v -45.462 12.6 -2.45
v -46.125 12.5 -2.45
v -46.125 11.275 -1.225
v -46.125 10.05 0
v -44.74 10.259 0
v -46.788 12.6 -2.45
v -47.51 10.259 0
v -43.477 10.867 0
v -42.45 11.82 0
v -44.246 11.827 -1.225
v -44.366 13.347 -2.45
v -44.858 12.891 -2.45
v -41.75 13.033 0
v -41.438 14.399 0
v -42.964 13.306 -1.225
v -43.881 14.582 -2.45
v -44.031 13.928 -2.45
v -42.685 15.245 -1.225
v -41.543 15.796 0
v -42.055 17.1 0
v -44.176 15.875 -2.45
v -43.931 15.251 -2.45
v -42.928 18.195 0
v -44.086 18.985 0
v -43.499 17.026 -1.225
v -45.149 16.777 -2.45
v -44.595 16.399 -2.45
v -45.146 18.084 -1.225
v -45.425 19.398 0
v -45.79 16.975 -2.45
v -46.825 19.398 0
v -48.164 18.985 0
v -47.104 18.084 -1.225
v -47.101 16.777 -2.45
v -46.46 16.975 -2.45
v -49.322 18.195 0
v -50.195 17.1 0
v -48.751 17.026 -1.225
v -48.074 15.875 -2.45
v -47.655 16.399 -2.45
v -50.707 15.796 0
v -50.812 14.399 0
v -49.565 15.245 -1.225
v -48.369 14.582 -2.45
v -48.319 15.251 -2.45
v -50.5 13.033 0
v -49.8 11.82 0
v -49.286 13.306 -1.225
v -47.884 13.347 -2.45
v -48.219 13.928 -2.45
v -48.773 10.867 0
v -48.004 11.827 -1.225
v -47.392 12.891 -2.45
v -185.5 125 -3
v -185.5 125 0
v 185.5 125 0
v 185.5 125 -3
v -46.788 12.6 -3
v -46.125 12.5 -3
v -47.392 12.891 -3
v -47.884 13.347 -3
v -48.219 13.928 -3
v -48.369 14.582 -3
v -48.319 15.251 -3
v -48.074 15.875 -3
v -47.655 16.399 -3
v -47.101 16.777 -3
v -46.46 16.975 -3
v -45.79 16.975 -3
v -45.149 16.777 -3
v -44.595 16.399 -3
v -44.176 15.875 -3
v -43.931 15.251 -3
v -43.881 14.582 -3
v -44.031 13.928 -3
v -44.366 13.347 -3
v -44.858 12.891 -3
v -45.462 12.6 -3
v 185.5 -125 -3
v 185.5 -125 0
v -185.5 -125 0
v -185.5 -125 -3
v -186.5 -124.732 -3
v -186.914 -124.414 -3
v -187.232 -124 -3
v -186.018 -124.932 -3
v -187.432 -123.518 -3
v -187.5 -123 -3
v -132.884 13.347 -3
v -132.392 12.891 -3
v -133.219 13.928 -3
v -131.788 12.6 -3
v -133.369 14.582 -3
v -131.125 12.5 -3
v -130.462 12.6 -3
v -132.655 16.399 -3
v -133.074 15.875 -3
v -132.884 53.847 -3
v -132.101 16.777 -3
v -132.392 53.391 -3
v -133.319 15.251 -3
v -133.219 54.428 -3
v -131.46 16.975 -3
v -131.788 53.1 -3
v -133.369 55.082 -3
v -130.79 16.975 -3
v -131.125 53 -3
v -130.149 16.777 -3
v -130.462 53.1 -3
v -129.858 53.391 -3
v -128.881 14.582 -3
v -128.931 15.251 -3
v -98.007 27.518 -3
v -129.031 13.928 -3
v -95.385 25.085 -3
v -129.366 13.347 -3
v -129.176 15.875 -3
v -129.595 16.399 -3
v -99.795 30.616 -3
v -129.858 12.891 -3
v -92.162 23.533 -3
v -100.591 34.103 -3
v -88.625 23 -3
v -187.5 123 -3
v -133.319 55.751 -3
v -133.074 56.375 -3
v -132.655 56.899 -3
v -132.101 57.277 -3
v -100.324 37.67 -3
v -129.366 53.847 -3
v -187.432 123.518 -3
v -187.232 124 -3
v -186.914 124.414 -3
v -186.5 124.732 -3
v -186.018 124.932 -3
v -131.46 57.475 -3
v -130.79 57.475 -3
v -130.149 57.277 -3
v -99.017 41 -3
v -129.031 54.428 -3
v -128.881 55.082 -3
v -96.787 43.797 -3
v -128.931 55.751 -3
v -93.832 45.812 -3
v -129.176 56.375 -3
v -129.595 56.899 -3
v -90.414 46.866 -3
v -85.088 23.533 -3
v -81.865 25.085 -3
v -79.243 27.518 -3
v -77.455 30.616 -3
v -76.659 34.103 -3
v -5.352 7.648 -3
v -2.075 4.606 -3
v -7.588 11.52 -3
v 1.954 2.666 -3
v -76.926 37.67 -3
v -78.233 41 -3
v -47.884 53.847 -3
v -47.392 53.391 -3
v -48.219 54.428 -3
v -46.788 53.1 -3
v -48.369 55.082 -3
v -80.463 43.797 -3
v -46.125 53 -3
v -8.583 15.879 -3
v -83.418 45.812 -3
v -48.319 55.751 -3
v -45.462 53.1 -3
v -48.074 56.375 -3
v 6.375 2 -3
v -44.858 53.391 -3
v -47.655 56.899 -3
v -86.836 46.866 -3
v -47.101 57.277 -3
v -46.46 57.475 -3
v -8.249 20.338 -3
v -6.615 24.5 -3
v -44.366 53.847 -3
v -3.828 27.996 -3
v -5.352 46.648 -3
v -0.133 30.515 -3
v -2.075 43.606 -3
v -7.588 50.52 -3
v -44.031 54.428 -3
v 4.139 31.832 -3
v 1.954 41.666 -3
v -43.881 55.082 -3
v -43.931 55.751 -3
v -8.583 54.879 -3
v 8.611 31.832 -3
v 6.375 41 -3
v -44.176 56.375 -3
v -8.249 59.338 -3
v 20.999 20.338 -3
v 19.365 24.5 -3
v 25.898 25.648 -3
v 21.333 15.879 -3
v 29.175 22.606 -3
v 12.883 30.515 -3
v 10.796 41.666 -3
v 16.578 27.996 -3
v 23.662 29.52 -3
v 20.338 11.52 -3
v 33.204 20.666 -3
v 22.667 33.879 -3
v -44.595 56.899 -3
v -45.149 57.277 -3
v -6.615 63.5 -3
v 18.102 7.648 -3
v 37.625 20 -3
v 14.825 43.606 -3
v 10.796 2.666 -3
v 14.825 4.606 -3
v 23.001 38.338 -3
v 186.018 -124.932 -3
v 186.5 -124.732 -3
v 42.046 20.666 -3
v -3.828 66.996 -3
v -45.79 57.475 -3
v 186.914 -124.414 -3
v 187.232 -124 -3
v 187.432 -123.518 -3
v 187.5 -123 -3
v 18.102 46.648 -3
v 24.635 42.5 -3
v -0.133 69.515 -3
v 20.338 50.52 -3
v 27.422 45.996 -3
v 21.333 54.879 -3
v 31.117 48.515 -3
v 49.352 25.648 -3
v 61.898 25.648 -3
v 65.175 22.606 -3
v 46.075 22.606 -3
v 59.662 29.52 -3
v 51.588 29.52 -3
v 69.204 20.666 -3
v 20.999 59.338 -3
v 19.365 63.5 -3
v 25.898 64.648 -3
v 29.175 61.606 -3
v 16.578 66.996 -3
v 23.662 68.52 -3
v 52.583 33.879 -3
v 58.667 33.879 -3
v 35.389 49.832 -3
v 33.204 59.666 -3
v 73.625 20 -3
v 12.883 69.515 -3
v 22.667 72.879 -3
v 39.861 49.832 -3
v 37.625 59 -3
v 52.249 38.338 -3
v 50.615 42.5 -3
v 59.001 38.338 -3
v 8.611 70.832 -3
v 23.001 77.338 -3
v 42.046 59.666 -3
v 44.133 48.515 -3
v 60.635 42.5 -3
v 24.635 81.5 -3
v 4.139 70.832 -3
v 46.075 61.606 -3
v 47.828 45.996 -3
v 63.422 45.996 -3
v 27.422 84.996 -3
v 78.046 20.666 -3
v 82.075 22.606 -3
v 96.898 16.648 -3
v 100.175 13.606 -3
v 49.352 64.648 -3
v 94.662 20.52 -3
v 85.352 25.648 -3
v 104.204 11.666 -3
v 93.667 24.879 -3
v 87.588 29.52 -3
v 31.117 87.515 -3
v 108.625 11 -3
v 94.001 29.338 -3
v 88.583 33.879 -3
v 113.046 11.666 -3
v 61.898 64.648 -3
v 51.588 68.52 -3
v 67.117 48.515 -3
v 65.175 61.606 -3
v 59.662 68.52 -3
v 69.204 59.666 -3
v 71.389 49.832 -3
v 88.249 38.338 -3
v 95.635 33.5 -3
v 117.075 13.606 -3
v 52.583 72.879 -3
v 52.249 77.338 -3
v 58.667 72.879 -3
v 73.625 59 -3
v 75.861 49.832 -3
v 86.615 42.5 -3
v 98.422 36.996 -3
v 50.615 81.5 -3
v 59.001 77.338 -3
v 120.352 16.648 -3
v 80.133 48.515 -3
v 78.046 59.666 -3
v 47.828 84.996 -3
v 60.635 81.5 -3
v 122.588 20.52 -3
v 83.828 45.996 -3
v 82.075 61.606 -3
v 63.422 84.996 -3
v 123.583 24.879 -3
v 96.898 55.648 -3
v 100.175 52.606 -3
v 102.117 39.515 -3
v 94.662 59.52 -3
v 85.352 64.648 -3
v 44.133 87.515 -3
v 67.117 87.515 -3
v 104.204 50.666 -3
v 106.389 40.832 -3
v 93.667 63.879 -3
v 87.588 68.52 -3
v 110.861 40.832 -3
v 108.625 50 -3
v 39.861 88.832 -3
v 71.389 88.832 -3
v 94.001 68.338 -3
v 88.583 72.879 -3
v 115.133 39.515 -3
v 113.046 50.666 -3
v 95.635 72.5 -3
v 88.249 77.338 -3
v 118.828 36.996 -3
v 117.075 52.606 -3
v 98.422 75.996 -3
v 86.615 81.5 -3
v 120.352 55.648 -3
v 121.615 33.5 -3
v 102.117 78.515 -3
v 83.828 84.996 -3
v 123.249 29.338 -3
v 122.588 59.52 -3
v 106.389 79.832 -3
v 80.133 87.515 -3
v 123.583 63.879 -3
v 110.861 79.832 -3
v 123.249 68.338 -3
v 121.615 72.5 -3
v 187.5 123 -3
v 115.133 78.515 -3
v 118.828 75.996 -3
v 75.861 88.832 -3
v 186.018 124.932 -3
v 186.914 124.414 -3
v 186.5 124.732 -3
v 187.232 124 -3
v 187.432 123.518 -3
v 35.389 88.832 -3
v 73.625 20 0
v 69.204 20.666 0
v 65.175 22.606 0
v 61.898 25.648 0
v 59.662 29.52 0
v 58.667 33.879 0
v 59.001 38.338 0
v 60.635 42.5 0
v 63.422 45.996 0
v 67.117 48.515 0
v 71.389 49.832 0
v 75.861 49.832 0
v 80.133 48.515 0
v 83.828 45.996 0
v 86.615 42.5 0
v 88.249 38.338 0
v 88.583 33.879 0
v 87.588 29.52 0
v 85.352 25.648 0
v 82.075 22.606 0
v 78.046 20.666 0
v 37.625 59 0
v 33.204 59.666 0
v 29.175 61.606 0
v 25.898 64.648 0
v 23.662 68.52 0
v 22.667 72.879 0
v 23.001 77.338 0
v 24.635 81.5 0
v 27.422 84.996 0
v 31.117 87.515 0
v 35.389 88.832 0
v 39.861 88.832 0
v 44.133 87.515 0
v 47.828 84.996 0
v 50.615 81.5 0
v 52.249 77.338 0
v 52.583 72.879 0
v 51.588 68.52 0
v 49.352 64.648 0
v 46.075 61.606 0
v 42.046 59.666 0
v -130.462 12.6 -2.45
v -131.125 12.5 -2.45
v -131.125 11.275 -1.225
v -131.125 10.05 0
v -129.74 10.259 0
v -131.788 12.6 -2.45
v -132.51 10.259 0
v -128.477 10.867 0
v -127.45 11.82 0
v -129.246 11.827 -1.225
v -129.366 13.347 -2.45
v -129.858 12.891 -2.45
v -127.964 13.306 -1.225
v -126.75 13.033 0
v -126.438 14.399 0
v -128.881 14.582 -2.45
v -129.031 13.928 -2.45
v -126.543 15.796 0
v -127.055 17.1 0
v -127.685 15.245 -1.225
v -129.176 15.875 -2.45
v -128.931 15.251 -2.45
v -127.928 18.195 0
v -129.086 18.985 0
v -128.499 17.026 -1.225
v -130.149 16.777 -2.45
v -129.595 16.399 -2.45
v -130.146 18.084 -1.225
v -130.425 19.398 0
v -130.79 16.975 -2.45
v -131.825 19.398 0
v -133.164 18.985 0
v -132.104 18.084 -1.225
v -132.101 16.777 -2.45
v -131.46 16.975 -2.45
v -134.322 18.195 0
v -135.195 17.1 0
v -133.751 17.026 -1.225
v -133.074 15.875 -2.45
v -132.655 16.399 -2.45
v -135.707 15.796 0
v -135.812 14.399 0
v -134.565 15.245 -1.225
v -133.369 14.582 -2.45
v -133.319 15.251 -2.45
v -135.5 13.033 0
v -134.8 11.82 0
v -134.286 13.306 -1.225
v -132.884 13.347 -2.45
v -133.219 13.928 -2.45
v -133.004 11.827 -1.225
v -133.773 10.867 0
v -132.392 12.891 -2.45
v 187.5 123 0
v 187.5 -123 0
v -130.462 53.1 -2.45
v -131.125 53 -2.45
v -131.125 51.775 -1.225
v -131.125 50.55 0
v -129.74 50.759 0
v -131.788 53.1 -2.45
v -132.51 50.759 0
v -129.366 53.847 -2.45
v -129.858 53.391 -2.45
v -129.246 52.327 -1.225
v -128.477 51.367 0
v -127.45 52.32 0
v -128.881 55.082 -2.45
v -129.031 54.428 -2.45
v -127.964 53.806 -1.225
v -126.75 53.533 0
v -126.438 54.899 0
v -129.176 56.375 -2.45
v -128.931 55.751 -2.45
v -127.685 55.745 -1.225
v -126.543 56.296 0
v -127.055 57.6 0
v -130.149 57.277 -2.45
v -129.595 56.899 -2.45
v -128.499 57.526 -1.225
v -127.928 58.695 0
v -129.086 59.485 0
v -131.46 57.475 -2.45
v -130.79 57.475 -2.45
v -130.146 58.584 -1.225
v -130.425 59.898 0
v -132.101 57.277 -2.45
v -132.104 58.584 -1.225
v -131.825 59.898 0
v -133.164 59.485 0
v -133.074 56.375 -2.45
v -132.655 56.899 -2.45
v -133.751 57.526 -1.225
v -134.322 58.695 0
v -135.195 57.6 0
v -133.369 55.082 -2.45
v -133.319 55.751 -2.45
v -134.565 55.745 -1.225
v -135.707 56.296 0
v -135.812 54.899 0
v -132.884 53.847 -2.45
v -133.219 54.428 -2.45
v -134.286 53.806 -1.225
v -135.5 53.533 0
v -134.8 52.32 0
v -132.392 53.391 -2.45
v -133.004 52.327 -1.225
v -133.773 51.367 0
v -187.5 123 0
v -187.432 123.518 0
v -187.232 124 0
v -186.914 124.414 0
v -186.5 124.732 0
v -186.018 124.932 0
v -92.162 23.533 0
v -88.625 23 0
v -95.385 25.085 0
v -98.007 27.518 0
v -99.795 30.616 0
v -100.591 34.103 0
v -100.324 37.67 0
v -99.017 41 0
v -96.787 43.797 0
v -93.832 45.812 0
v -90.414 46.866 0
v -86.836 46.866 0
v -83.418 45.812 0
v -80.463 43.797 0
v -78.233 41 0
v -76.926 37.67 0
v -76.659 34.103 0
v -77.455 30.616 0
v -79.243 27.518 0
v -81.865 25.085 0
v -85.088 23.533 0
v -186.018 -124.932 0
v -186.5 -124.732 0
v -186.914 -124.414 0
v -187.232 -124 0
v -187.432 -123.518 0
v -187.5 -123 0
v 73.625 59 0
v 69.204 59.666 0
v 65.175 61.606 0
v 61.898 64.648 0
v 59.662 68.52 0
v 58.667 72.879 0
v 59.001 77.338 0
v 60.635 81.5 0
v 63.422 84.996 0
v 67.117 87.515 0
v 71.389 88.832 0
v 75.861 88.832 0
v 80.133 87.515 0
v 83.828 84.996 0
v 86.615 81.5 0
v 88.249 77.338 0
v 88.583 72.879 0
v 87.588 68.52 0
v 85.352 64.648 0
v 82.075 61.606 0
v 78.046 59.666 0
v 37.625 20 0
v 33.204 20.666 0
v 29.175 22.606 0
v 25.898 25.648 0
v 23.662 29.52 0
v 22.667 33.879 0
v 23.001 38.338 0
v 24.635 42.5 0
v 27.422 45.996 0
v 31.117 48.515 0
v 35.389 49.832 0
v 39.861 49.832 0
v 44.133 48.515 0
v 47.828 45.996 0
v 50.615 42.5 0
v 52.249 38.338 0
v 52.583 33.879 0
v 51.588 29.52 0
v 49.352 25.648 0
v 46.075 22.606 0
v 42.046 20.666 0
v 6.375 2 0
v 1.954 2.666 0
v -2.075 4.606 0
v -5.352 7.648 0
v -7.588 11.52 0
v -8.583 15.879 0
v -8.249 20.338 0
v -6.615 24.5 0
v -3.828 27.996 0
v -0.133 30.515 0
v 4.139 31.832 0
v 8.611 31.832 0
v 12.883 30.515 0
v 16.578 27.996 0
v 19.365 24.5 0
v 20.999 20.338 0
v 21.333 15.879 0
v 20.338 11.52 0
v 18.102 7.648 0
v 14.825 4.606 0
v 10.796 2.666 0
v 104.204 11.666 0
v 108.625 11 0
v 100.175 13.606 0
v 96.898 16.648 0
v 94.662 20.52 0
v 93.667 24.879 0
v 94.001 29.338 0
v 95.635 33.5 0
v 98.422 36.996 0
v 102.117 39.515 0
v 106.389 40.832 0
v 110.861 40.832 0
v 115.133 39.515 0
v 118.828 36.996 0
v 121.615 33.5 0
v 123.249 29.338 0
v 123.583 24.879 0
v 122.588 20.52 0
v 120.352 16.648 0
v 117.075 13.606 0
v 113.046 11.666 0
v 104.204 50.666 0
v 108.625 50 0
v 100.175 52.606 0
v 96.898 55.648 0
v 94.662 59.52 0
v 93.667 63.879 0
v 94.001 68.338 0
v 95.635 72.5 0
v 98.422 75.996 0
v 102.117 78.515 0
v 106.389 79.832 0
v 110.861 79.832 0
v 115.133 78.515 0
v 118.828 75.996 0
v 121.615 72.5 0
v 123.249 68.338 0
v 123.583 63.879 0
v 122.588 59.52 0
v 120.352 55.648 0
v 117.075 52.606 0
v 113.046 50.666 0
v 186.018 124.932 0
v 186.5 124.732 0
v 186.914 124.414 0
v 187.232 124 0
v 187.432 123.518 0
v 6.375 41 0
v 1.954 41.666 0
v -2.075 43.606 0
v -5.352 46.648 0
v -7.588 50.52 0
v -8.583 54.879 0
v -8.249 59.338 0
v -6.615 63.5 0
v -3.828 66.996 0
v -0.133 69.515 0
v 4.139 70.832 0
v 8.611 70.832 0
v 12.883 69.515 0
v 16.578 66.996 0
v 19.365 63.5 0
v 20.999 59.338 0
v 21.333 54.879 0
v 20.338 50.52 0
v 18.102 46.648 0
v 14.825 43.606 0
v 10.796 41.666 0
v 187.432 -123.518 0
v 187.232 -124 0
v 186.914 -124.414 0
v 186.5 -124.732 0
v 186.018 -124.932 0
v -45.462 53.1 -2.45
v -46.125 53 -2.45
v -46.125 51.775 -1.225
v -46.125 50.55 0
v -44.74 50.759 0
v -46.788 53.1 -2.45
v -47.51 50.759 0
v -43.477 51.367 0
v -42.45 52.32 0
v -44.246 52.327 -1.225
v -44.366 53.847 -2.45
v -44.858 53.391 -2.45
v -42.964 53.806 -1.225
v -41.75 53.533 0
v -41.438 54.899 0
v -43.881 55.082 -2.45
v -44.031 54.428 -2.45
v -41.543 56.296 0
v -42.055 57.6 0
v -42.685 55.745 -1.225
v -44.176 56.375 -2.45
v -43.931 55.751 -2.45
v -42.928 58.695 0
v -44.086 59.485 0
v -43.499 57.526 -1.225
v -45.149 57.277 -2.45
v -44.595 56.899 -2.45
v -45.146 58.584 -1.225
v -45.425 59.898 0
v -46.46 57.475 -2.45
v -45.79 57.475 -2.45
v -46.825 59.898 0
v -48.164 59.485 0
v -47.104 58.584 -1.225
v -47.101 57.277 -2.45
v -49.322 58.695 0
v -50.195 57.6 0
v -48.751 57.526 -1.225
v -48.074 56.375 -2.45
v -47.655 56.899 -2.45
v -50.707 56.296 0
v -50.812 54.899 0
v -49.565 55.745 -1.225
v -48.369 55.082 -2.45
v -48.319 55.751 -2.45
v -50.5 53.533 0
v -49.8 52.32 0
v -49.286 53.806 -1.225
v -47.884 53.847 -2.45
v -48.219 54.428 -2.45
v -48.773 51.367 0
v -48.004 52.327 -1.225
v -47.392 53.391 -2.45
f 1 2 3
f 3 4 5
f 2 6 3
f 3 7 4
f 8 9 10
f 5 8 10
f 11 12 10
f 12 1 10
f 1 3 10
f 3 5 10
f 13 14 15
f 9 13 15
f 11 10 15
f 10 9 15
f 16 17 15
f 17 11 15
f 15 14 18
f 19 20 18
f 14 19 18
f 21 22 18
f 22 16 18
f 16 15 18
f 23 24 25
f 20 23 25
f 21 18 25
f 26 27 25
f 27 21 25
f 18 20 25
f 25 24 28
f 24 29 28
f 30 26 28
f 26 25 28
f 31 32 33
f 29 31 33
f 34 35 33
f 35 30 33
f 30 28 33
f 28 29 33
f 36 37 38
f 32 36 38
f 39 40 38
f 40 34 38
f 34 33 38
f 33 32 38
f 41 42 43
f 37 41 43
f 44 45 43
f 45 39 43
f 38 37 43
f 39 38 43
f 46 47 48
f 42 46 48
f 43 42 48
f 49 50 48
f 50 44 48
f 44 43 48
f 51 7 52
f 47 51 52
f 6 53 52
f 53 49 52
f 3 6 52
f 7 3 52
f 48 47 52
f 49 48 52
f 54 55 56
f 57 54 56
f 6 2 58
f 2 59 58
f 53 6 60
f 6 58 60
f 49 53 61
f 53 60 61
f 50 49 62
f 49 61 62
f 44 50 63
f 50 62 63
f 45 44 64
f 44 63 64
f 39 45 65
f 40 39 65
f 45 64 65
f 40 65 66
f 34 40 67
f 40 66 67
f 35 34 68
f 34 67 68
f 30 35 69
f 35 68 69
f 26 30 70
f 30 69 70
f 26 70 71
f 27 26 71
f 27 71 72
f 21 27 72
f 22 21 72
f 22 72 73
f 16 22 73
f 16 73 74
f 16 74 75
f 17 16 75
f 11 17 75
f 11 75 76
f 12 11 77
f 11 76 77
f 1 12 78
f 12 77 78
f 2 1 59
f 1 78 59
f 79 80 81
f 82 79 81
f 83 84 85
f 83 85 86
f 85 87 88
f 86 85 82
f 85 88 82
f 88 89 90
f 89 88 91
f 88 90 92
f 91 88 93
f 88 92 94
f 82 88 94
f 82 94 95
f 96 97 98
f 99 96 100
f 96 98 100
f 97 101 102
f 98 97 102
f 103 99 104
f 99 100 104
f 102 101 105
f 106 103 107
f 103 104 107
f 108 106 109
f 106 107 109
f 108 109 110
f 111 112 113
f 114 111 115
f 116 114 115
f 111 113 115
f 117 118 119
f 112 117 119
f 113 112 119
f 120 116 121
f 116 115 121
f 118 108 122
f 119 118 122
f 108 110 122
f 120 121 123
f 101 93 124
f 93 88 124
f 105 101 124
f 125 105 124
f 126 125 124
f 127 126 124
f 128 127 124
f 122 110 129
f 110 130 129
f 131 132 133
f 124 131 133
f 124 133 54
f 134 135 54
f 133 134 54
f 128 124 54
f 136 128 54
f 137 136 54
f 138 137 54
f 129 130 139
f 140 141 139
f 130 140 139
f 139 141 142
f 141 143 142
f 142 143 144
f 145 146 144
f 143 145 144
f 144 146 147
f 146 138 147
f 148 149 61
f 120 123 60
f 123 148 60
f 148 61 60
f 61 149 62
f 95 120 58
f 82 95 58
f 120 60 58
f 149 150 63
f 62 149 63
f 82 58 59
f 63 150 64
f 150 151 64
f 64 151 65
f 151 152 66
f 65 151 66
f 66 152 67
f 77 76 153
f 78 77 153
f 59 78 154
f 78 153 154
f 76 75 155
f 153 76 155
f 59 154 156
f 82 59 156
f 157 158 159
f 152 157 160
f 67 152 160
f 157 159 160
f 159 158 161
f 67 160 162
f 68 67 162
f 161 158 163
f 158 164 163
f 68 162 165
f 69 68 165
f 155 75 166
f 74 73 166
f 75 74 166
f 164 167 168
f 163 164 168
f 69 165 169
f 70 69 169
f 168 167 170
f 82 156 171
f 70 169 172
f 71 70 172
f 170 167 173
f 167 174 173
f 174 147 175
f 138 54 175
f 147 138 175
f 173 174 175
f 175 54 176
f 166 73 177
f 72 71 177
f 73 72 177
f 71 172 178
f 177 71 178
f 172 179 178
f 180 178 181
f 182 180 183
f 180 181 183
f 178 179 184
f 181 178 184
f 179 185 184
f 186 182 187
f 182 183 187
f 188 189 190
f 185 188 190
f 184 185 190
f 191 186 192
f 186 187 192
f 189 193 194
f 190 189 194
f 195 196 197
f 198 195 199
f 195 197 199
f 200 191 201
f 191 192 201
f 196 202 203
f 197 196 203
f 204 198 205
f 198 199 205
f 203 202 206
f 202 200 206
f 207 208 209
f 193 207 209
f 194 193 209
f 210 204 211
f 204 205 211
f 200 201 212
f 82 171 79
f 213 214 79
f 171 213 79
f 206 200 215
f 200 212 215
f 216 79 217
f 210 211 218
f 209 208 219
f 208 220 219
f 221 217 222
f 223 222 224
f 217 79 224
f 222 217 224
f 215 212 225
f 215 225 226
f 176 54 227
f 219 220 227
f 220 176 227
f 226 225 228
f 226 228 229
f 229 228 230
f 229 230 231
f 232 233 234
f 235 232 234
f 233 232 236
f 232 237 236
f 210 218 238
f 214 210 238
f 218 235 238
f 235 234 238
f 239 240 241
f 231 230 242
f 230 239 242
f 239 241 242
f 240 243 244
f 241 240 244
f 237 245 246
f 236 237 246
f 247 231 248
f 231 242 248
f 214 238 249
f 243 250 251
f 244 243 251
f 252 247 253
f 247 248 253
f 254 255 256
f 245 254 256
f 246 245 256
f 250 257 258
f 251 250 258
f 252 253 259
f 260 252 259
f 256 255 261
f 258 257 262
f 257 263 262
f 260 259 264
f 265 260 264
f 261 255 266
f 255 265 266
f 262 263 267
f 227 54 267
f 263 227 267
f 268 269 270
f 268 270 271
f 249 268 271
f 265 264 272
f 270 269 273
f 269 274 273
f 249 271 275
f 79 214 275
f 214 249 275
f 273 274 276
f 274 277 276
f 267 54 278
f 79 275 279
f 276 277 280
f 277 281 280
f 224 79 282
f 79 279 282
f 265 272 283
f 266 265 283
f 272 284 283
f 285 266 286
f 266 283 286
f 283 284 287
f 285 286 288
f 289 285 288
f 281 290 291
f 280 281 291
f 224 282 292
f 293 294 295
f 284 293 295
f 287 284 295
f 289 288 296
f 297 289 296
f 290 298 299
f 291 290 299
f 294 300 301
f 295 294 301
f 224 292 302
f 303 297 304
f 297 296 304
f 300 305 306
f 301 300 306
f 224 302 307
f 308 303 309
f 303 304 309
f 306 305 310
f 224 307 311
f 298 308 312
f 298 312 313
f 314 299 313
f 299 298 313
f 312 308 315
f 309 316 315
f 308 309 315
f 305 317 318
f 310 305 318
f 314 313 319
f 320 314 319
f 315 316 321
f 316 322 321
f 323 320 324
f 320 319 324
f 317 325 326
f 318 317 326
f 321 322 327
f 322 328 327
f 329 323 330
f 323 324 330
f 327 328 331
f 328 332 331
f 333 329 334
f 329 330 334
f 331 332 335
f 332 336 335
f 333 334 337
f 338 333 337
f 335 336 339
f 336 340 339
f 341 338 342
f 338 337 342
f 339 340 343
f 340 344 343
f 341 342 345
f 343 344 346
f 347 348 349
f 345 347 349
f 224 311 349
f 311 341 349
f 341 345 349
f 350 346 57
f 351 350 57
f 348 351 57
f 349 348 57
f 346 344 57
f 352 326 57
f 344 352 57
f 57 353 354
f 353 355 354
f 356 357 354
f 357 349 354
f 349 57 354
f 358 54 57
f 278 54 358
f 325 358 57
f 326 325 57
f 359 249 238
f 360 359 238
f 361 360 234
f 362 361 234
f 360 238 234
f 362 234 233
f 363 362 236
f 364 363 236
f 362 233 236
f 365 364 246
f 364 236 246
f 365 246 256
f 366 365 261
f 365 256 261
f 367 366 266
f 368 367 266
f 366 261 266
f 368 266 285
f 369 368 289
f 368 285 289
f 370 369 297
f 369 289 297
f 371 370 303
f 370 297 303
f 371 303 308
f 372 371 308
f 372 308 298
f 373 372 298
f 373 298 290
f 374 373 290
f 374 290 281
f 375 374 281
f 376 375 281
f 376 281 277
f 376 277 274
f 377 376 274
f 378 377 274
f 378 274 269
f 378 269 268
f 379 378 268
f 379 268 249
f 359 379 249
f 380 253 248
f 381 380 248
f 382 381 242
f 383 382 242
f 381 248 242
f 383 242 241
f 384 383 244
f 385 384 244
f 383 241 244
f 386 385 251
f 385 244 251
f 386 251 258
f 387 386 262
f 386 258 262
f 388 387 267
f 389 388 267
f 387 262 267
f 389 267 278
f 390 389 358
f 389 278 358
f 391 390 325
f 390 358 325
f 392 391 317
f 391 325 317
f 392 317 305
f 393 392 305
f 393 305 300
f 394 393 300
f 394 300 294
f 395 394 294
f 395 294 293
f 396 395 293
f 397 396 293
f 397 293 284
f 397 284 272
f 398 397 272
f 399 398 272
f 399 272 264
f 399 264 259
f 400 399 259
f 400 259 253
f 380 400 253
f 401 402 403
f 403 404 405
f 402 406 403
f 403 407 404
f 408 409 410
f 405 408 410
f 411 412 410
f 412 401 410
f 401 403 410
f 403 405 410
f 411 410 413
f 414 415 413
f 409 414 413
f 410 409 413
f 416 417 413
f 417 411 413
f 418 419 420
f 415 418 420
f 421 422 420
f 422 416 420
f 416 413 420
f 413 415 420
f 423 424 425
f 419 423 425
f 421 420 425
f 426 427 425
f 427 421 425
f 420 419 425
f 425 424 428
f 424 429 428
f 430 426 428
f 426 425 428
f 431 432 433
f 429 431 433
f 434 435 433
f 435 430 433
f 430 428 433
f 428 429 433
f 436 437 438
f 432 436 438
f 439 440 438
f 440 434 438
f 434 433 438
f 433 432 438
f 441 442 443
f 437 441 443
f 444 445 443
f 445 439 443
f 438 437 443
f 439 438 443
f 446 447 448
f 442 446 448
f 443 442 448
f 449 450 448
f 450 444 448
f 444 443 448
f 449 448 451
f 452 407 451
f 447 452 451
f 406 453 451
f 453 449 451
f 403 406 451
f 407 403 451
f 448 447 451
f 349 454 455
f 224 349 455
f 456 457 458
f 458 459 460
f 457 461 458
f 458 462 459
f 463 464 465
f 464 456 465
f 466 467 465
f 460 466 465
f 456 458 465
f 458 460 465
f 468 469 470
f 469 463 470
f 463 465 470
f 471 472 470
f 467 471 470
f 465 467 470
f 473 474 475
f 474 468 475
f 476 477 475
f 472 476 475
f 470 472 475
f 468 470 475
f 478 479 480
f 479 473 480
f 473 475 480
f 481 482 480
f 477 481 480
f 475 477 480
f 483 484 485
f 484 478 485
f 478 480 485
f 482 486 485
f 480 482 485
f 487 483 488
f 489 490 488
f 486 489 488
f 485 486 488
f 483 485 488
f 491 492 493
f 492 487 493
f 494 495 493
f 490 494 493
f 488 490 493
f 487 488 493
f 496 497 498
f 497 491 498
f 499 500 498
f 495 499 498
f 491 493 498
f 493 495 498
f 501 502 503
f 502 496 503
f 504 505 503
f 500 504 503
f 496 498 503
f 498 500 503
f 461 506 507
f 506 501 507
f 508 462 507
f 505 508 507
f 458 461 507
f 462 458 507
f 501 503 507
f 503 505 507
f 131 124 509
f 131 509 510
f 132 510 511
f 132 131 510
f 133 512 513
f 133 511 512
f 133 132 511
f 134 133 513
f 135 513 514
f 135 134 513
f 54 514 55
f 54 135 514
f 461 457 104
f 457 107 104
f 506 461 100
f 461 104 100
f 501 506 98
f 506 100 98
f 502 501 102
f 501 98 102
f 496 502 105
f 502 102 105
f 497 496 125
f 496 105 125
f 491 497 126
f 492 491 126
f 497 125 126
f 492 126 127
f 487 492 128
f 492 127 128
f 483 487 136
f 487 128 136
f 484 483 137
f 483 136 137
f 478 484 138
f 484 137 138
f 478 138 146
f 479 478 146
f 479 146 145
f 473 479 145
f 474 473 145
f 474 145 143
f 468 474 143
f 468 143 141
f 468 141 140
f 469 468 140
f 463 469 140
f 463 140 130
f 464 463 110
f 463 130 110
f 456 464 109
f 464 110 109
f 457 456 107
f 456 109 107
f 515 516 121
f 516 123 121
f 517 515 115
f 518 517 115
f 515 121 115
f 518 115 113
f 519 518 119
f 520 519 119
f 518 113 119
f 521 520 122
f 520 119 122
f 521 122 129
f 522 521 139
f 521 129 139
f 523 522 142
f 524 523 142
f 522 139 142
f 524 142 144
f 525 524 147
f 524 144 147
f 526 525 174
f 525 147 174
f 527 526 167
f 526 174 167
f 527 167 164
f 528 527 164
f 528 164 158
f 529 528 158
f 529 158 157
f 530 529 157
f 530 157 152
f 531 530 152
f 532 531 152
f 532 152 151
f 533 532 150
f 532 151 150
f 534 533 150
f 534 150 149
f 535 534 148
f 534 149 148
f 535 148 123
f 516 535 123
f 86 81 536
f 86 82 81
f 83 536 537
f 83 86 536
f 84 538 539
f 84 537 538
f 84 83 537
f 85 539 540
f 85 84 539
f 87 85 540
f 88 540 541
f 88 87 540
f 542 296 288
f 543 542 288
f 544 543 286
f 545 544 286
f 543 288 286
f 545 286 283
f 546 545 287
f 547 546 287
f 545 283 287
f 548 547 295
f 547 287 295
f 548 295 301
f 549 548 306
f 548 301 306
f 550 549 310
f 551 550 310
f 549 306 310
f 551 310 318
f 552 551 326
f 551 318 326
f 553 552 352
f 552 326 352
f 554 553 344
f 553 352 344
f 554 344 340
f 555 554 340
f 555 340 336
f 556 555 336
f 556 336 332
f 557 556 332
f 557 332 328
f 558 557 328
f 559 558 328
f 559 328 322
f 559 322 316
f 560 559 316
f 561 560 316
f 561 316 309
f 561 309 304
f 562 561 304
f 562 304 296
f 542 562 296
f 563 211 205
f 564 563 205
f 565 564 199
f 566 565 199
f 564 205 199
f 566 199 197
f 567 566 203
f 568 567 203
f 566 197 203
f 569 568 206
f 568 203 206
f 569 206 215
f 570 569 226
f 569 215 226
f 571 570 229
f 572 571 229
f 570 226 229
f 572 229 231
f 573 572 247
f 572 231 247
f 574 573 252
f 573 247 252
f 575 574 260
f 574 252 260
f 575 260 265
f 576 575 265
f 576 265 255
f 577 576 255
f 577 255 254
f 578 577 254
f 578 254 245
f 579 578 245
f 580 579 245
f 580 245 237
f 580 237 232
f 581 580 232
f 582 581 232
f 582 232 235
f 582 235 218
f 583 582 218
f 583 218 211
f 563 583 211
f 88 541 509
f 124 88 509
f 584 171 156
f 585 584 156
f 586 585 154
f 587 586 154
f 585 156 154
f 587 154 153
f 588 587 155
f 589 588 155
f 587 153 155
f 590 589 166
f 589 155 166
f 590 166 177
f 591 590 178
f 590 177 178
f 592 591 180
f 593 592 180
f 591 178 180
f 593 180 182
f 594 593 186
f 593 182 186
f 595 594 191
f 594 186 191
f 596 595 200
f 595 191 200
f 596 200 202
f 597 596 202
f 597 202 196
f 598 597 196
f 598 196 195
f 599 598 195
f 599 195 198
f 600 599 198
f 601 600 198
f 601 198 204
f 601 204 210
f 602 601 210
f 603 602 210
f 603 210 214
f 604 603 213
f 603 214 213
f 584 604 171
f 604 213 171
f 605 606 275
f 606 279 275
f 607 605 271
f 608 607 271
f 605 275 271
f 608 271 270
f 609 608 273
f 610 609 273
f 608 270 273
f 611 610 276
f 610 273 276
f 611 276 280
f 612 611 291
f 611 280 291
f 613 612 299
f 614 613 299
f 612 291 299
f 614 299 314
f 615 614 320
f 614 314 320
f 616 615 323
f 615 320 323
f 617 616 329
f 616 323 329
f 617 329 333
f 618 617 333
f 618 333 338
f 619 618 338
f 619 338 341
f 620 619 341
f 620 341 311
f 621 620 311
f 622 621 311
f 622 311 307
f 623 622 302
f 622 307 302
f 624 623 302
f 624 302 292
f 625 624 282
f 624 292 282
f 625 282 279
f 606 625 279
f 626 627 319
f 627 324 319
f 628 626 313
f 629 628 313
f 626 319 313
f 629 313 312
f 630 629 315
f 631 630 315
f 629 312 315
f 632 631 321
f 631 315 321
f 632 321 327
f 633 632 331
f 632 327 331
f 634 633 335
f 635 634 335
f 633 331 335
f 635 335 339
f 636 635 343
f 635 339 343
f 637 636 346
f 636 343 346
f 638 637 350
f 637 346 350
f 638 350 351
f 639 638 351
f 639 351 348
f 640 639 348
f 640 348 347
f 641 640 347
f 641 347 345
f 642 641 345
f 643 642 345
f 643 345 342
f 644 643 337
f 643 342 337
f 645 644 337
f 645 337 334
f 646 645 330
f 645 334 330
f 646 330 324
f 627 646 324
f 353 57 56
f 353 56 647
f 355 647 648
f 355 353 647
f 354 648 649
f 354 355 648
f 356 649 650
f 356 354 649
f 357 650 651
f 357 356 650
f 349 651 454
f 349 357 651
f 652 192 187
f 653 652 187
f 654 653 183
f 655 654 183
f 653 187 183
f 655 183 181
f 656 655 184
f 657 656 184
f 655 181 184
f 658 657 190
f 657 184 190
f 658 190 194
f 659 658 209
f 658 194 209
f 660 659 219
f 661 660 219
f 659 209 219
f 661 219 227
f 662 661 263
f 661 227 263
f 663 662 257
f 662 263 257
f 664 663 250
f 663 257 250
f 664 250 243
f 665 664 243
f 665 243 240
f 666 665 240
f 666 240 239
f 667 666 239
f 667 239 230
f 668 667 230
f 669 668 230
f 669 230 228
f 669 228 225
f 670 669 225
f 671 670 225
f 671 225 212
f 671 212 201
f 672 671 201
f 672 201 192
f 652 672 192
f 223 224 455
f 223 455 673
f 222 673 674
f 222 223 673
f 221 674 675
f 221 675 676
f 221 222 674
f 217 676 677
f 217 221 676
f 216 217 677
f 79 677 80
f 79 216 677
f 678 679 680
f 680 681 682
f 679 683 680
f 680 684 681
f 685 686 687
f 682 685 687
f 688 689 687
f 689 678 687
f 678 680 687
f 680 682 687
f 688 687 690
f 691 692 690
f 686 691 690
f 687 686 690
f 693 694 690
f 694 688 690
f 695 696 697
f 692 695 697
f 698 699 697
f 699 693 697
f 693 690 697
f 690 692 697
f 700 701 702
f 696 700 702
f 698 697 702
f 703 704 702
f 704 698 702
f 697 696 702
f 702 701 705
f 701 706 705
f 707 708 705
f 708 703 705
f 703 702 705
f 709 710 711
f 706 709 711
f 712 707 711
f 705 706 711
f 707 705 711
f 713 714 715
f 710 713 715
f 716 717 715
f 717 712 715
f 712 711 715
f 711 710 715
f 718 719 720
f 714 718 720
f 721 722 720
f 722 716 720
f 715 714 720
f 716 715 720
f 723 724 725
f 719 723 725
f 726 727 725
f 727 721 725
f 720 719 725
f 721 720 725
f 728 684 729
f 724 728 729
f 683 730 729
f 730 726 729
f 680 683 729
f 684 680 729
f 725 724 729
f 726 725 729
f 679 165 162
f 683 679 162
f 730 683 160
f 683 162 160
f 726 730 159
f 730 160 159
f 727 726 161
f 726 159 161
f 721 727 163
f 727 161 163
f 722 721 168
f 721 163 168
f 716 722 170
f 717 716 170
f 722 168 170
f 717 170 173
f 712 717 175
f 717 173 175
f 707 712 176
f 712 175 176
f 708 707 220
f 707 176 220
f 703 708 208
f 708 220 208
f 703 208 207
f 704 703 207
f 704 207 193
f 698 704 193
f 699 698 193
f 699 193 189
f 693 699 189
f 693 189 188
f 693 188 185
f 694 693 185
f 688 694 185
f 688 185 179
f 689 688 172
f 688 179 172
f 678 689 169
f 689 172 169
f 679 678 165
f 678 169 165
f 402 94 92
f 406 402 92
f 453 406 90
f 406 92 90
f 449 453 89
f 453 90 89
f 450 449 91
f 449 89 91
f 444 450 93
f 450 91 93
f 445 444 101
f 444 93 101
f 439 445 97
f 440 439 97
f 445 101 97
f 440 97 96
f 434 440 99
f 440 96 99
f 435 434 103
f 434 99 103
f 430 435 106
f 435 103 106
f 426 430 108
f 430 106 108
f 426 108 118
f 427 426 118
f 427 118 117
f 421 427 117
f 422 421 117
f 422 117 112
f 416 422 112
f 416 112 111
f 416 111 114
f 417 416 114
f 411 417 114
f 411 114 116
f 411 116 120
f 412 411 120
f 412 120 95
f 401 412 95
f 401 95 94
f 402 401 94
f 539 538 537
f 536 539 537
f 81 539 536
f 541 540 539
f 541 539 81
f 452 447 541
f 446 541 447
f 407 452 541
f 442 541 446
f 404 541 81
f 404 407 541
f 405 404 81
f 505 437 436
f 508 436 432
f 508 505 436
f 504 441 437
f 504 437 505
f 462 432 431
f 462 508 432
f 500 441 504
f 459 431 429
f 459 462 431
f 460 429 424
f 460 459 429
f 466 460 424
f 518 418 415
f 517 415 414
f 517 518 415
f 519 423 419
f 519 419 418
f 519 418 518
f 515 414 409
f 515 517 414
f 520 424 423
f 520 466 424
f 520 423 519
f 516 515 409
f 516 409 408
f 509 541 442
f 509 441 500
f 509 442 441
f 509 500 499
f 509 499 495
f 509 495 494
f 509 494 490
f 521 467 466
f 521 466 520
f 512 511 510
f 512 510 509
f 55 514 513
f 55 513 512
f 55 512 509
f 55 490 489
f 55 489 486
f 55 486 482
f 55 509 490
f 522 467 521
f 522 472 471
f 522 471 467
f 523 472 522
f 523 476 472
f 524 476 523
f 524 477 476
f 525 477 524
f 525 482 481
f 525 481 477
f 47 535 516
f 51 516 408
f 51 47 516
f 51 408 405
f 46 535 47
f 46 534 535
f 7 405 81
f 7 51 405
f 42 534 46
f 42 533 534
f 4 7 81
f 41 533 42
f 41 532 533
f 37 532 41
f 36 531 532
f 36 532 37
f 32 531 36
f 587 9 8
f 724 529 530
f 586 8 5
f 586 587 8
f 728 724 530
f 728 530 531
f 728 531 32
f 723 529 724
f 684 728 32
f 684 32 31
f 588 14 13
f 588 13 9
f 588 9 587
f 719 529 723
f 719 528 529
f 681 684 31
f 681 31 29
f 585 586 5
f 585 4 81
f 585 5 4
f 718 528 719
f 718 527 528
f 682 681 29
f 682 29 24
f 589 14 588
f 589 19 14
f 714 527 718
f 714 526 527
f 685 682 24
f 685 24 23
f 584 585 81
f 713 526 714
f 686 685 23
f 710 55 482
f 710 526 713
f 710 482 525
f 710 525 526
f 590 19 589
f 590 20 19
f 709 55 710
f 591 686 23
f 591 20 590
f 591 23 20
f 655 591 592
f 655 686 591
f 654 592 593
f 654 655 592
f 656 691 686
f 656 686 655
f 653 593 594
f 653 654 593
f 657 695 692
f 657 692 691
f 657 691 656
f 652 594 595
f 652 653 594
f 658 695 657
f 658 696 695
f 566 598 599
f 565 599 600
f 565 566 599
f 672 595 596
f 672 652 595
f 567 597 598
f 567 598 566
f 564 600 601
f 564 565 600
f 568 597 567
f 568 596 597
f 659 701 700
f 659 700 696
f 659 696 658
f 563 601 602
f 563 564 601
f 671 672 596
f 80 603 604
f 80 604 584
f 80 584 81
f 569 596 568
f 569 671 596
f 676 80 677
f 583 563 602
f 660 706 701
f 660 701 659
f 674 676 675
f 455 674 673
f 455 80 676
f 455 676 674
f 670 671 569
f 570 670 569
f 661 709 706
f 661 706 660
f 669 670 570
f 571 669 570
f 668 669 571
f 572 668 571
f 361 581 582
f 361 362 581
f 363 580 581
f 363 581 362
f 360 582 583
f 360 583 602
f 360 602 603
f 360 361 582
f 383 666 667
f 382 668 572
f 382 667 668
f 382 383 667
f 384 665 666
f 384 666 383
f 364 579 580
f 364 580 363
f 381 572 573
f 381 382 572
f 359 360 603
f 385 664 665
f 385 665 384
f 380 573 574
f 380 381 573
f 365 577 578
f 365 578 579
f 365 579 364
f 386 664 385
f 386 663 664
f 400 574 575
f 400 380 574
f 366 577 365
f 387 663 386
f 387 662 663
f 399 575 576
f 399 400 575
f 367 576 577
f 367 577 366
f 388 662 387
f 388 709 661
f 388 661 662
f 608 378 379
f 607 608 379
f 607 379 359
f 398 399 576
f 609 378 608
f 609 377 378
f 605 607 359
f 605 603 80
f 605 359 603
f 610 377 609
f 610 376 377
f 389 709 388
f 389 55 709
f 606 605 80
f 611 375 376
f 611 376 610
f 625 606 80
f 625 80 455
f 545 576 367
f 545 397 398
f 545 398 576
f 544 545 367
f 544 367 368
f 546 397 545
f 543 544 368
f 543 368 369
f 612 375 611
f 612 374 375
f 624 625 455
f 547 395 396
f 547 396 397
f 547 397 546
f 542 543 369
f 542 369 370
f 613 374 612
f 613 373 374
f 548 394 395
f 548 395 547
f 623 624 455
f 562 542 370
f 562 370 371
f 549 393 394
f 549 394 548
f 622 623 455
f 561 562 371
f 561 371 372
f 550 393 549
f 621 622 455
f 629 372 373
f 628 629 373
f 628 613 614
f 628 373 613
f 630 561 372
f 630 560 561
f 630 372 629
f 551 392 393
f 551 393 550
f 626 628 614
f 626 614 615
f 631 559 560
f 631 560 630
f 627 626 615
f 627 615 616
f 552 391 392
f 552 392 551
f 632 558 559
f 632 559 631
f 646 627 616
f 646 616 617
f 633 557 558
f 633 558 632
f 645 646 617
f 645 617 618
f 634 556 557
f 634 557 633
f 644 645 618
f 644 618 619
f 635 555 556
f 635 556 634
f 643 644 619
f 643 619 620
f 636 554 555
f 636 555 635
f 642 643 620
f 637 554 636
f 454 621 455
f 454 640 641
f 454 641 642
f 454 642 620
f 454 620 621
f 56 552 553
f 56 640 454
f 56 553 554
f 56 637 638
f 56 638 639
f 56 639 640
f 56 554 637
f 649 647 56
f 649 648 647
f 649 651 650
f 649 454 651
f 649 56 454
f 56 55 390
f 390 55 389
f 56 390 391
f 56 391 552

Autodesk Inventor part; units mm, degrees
ref_plane "YZ Plane" through (0, 0, 0) normal (1, 0, 0) x (0, 1, 0)
ref_plane "XZ Plane" through (0, 0, 0) normal (0, 1, 0) x (-1, 0, 0)
ref_plane "XY Plane" through (0, 0, 0) normal (0, 0, 1) x (1, 0, 0)
sketch "Panel" plane through (0, 0, 0) normal (0, 0, 1) x (1, 0, 0)
  line L0 (-187.5, 125) -> (187.5, 125)
  line L1 (187.5, 125) -> (187.5, -125)
  line L2 (187.5, -125) -> (-187.5, -125)
  line L3 (-187.5, -125) -> (-187.5, 125)
  point P0 (0, 0)
  point P1 (-187.5, 0)
  point P2 (0, 125)
  dimension "d0" = 250
  dimension "d3" = 375
sketch "JoystickMount" plane through (0, 0, 0) normal (0, 0, 1) x (1, 0, 0)
  line L0 (-131.125, 55.25) -> (-131.125, 14.75) construction
  line L1 (-131.125, 14.75) -> (-46.125, 14.75) construction
  point P0 (0, 0)
  point P1 (-88.625, 35)
  point P2 (-46.125, 55.25)
  point P3 (-131.125, 35)
  point P4 (-88.625, 14.75)
  dimension "d4" = 40.5
  dimension "d6" = 85
  dimension "d19" = 35
  dimension "d45" = 88.625
sketch "ButtonMounts" plane through (0, 0, 0) normal (0, 0, 1) x (1, 0, 0)
  point P0 (0, 0)
  point P1 (6.375, 56)
  point P2 (6.375, 17)
  point P3 (37.625, 74)
  point P4 (37.625, 35)
  point P5 (73.625, 74)
  point P6 (73.625, 35)
  point P7 (108.625, 65)
  point P8 (108.625, 26)
  point P9 (-88.625, 35)
  dimension "d7" = 39
  dimension "d9" = 39
  dimension "d10" = 39
  dimension "d11" = 39
  dimension "d12" = 31.25
  dimension "d13" = 36
  dimension "d14" = 35
  dimension "d15" = 18
  dimension "d16" = 9
  dimension "d17" = 95
extrude "PanelExtrusion" add sketch "Panel" against normal blind 3
hole "JoystickScrews" at (-46.125, 14.75, 0) at (-46.125, 55.25, 0) at (-131.125, 55.25, 0) at (-131.125, 14.75, 0) direction (0, 0, -1) diameter 4.5 end through all countersink diameter 9.4 countersink angle 90 clearance for "Flat Head Machine Screw" size "M4" standard "Ansi Metric M Profile"
hole "JoystickShaft" at (-88.625, 35, 0) direction (0, 0, -1) diameter 24 end through all
hole "ButtonHoles" at (108.625, 26, 0) at (73.625, 35, 0) at (73.625, 74, 0) at (108.625, 65, 0) at (37.625, 74, 0) at (37.625, 35, 0) at (6.375, 56, 0) at (6.375, 17, 0) direction (0, 0, -1) diameter 30 end through all
fillet "PanelCornerFillets" radius 2 4 edges at (187.5, 125, -1.5) (187.5, -125, -1.5) (-187.5, 125, -1.5) (-187.5, -125, -1.5)
ref_plane "BottomPanelWorkPlane" through (187.5, -125, -3) normal (0, -0.1736, -0.9848) x (-1, 0, 0)
sketch "ProjectedEdgesBase" plane through (187.5, -125, -3) normal (0, -0.1736, -0.9848) x (-1, 0, 0)
  line L0 (0, 244.2323) -> (0, 1.9696) projected
  line L1 (373, 246.2019) -> (2, 246.2019) projected
  line L2 (375, 1.9696) -> (375, 244.2323) projected
  line L3 (2, -0.5209) -> (373, -0.5209) projected
  line L4 (375, 246.2019) -> (0, 246.2019)
  line L5 (0, 246.2019) -> (0, -0.5209)
  line L6 (0, -0.5209) -> (375, -0.5209)
  line L7 (375, -0.5209) -> (375, 246.2019)
  point P0 (187.5, 122.58)
  point P1 (187.5, 246.2019)
  point P2 (187.5, 246.2019)
  point P3 (187.5, -0.5209)
  point P4 (187.5, -0.5209)
  point P5 (375, 122.8405)
  point P6 (375, 123.101)
  point P7 (0, 122.8405)
  point P8 (0, 123.101)
properties part number "Panel_top_2"
